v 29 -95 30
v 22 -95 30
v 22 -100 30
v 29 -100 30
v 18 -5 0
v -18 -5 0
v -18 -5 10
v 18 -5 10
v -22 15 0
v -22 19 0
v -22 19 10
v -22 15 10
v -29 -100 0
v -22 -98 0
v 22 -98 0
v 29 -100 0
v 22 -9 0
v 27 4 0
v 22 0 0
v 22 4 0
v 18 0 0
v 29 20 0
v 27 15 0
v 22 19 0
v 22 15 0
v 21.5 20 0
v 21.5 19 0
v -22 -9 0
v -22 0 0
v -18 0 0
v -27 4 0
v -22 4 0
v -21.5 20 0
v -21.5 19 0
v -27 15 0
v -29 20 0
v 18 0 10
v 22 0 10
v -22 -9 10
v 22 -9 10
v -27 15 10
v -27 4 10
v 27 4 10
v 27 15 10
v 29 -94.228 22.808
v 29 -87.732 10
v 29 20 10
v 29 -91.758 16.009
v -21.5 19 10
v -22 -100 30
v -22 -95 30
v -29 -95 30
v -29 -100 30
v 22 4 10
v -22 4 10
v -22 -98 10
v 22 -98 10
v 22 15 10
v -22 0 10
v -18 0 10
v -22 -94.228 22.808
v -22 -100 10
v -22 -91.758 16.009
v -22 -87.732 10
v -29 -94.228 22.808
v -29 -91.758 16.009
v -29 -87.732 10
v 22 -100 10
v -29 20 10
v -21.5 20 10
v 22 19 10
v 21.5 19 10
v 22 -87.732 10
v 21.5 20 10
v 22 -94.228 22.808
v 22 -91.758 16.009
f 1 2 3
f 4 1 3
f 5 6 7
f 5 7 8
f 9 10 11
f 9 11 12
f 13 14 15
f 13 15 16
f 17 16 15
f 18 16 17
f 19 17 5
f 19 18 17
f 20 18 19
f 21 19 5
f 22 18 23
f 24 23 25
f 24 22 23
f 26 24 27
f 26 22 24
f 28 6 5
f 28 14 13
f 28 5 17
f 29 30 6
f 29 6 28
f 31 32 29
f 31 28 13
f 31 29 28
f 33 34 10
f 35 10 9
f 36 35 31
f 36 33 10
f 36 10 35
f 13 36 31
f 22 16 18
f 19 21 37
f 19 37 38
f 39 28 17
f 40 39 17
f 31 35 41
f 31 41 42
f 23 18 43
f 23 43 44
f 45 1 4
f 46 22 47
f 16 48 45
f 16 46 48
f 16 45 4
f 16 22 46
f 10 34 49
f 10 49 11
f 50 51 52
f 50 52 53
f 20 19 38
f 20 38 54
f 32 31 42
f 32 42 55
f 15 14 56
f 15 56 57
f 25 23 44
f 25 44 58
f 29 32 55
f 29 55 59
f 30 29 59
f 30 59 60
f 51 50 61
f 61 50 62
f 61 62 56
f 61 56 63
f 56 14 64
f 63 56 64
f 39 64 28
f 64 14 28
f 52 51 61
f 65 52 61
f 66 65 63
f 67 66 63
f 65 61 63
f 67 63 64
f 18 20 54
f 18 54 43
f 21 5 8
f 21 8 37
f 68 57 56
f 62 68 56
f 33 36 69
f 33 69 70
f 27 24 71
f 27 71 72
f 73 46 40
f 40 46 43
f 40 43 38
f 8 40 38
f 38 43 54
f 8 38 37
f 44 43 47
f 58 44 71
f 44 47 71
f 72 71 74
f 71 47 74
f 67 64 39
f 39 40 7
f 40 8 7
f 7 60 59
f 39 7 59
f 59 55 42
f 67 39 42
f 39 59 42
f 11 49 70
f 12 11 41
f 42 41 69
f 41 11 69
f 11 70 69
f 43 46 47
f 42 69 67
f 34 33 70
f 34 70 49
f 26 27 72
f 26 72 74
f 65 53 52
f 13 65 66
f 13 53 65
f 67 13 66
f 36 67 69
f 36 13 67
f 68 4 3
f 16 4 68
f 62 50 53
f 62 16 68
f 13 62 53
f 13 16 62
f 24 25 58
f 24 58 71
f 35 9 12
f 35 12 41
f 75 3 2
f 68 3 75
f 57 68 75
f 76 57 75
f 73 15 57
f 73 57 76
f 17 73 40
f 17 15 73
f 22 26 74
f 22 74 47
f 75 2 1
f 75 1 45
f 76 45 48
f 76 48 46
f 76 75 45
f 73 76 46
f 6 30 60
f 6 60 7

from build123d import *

# Parameters (mm, degrees)
SKETCH_W     = 44
SKETCH_H     = 89
PAD_DEPTH    = 10
PAD001_DEPTH = 7
PAD002_DEPTH = 7


with BuildPart() as part:
    # Sketch → Pad (new body)
    with BuildSketch(Plane.XY):
        Polygon((-22, 0), (-18, 0), (-18, -5), (18, -5), (18, 0), (22, 0), (22, 4), (27, 4), (27, 15), (22, 15), (22, 19), (21.5, 19), (21.5, 20), (29, 20), (29, -100), (-29, -100), (-29, 20), (-21.5, 20), (-21.5, 19), (-22, 19), (-22, 15), (-27, 15), (-27, 4), (-22, 4), align=None)
        with Locations((0, -53.5)):
            Rectangle(SKETCH_W, SKETCH_H, mode=Mode.SUBTRACT)
    extrude(amount=PAD_DEPTH)

    # Sketch001 (on DatumPlane) → Pad001 (join)
    with BuildSketch(Plane.YZ.offset(-22)):
        with BuildLine():
            Line((-100, 0), (-100, 30))
            Line((-95, 30), (-100, 30))
            ThreePointArc((-95, 30), (-88.049566, 10.375362), (-70, 0))
            Line((-100, 0), (-70, 0))
        make_face()
    extrude(amount=-PAD001_DEPTH)

    # Sketch002 (on DatumPlane) → Pad002 (join)
    with BuildSketch(Plane.YZ.offset(22)):
        with BuildLine():
            Line((-100, 0), (-100, 30))
            Line((-95, 30), (-100, 30))
            ThreePointArc((-95, 30), (-88.049566, 10.375362), (-70, 0))
            Line((-100, 0), (-70, 0))
        make_face()
    extrude(amount=PAD002_DEPTH)


solid = part.part
